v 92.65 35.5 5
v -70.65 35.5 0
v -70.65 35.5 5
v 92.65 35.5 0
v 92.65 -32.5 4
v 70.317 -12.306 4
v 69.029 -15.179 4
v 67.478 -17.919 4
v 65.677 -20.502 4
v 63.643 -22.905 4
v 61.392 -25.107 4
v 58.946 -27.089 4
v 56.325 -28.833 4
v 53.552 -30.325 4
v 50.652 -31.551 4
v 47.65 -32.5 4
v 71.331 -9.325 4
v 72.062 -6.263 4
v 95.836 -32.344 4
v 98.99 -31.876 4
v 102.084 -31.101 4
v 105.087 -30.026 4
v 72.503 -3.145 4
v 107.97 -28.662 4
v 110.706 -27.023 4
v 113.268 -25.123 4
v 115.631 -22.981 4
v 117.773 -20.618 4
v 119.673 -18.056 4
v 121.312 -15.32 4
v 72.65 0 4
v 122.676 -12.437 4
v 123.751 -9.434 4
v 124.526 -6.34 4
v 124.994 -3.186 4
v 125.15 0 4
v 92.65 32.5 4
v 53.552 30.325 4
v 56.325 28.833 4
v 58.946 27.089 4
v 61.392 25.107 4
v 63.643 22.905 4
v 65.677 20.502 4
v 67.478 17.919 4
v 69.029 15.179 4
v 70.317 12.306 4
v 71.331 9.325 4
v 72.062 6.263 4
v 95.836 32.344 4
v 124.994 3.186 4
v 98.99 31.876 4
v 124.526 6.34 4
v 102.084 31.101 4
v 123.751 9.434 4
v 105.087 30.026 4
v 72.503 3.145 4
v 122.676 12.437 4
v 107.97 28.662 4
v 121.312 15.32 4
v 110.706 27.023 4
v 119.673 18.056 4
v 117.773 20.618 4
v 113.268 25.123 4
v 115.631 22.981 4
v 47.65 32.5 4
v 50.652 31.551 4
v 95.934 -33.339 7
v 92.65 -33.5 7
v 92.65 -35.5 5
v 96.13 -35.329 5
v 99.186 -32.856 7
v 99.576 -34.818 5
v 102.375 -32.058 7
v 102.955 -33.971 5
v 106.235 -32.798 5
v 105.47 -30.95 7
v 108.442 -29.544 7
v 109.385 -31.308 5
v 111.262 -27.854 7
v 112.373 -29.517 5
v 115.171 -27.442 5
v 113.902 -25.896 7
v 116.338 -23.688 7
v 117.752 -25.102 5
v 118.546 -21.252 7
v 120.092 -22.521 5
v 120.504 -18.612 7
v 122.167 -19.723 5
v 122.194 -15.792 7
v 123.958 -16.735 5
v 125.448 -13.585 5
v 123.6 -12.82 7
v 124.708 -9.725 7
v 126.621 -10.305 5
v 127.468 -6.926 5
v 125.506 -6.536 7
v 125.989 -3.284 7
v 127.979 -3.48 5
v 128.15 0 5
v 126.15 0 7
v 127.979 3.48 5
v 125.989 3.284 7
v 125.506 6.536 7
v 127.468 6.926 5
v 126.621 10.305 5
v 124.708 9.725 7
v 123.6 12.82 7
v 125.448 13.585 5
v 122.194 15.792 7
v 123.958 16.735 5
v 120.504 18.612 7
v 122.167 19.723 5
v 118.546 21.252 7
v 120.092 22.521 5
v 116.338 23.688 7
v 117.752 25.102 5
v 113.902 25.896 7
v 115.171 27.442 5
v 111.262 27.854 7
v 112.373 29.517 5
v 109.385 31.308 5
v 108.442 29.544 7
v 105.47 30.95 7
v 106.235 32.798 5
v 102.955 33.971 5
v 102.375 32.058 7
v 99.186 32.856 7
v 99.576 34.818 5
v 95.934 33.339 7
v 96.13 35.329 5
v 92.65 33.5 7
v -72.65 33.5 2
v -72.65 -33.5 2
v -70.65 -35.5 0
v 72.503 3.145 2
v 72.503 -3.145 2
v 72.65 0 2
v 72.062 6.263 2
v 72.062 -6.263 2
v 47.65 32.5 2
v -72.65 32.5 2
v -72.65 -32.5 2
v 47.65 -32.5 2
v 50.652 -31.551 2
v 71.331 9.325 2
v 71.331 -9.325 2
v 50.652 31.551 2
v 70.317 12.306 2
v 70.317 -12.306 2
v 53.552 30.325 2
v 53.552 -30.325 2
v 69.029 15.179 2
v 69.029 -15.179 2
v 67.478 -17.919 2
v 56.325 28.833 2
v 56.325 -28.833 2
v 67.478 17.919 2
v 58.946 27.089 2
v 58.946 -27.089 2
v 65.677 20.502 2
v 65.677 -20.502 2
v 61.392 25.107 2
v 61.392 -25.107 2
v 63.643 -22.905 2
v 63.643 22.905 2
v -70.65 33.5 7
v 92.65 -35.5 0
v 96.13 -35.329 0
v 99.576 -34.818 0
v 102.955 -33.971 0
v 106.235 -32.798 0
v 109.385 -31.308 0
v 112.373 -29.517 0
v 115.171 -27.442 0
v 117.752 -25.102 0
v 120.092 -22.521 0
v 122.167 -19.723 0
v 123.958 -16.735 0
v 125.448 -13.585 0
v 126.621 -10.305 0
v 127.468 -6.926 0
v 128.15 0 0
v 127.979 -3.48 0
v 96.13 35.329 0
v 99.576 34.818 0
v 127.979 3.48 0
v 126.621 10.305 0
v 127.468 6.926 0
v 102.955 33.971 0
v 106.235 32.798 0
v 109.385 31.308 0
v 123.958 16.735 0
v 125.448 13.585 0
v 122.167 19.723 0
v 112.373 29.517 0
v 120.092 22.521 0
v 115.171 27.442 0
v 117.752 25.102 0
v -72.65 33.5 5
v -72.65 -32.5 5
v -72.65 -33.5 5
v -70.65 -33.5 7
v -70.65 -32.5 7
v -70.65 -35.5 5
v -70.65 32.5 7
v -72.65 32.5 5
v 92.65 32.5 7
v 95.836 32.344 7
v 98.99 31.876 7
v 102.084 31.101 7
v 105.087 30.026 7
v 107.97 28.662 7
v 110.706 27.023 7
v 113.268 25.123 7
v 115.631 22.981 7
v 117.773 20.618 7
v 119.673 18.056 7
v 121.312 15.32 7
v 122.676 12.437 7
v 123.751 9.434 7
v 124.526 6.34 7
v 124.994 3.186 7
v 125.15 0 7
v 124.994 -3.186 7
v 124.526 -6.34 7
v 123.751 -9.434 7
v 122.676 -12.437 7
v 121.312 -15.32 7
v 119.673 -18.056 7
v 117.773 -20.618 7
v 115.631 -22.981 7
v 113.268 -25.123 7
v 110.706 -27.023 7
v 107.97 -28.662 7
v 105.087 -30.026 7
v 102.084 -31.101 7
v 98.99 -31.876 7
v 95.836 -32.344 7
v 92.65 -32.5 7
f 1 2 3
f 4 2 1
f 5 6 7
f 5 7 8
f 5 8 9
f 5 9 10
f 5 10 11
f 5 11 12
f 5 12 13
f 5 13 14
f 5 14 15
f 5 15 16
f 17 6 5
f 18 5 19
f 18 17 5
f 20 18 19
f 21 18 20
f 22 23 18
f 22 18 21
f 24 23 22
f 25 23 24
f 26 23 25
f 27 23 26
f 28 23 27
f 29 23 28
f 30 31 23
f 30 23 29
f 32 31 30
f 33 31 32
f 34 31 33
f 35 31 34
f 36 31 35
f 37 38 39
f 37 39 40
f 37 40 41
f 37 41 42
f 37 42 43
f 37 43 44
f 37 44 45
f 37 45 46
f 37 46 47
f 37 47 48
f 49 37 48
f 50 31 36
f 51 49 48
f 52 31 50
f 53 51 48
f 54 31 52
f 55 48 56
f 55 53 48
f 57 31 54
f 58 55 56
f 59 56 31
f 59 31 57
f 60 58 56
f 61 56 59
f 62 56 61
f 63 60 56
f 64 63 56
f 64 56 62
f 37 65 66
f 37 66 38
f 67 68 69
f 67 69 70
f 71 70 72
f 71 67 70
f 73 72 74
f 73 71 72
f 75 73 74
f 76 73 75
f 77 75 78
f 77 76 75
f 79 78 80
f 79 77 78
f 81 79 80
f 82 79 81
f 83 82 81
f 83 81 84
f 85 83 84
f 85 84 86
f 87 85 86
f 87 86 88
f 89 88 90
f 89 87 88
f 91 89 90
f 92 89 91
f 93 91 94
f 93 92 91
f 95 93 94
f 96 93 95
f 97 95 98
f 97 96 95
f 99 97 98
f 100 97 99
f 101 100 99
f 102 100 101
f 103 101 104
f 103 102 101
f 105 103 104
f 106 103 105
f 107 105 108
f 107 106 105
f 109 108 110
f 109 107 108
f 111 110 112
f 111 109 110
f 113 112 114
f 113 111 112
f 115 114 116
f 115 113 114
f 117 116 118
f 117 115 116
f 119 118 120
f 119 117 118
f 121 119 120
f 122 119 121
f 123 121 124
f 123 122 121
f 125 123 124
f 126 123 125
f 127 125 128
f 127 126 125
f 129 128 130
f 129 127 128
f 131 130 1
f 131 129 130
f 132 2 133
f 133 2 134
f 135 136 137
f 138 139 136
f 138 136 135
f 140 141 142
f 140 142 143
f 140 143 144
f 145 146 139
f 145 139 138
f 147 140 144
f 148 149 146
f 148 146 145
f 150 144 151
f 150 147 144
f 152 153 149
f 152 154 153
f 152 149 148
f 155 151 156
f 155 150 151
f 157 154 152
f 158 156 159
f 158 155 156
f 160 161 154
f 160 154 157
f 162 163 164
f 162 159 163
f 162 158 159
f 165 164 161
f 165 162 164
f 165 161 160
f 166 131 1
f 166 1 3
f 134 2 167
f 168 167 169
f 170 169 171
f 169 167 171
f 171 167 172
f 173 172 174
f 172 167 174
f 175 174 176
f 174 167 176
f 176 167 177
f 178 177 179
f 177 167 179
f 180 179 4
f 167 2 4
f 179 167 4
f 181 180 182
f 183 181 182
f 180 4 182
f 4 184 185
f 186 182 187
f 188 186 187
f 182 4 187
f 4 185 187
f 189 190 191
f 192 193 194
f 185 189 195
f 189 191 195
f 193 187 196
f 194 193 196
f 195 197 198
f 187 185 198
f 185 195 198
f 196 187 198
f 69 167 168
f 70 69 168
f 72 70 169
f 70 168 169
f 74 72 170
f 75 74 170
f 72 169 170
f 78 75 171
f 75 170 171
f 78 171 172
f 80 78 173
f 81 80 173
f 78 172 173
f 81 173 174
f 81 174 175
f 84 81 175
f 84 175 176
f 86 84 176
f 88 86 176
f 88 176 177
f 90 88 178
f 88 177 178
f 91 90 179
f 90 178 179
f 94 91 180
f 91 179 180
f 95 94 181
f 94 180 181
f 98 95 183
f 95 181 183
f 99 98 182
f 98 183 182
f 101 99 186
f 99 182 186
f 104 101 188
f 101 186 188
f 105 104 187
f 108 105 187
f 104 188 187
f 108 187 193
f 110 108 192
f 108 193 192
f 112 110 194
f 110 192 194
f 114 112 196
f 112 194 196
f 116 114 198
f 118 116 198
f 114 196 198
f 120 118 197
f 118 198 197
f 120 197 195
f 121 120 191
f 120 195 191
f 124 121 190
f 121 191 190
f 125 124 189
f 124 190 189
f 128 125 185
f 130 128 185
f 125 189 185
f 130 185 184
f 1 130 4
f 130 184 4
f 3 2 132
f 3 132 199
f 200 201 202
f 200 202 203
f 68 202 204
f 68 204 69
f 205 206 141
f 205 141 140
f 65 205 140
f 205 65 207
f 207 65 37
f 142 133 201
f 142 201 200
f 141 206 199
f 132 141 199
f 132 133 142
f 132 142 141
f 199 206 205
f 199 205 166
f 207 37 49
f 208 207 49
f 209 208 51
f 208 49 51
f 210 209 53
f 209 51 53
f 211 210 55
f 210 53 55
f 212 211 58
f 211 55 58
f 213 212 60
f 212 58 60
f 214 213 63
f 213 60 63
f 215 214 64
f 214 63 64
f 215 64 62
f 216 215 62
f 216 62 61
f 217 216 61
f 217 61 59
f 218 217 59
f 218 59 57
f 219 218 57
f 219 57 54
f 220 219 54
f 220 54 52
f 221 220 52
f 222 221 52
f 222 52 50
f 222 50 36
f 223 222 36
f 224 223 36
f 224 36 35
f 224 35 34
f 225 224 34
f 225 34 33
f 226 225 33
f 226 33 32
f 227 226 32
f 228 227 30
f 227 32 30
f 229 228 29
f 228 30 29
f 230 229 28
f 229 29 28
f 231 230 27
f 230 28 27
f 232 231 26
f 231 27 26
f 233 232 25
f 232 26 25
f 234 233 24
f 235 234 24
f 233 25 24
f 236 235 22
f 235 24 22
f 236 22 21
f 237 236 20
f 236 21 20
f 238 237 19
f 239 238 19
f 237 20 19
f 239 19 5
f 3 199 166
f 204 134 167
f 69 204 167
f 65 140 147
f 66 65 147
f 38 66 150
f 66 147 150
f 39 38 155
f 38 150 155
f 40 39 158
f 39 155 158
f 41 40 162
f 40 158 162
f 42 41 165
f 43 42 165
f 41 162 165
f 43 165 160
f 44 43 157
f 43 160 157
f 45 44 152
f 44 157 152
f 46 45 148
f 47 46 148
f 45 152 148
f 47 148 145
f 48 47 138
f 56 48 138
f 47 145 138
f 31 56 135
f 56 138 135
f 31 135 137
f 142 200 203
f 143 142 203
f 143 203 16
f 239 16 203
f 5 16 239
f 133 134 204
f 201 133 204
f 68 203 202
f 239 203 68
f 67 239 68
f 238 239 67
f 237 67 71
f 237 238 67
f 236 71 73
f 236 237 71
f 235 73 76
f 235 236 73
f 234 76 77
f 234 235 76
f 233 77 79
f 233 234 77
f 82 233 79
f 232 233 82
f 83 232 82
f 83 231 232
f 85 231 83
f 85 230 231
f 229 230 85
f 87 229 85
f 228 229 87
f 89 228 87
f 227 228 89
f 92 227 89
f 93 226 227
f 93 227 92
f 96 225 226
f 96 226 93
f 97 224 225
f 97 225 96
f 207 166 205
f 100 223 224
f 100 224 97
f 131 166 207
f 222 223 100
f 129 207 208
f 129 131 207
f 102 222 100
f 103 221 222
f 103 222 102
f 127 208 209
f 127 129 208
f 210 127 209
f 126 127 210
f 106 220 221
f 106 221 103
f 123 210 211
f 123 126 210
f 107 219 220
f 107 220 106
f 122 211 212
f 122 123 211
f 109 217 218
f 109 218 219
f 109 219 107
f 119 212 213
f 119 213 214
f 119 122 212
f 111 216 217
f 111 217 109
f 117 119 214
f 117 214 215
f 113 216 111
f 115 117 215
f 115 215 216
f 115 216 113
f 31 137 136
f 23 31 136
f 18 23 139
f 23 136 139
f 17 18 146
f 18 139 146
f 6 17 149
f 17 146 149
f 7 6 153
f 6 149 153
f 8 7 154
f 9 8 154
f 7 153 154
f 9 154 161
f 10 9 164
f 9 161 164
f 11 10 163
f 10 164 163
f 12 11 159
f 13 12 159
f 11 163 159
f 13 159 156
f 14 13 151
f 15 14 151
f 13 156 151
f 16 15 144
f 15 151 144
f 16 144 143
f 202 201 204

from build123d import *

# Parameters (mm, degrees)
F0_W     = 145.3
F0_H     = 65
F1_DEPTH = 2
F0_W_2   = 20
F3_DEPTH = 4
F4_DEPTH = 2
F0_H_2   = 3
F5_DEPTH = 7
F6_DEPTH = 7
F7_SIZE  = 1.99999


# Not quite as in the source:
# - a fillet or chamfer is up to 0.001 mm smaller than in the source, because OpenCascade refuses the exact size


with BuildPart() as f1:
    # F0 (on Top) → F1 (new body)
    with BuildSketch(Plane.XY):
        Rectangle(F0_W, F0_H)
    extrude(amount=F1_DEPTH)

    # F0 (on Top) → F3 (join)
    with BuildSketch(Plane.XY):
        with Locations((82.65, 0)):
            Rectangle(F0_W_2, F0_H)
        with BuildLine():
            ThreePointArc((92.65, -32.5), (125.15, 0), (92.65, 32.5))
            Line((92.65, 32.5), (92.65, -32.5))
        make_face()
    extrude(amount=F3_DEPTH)

    # F2 (on face) → F4 (join)
    with BuildSketch(Plane.XY.offset(2)):
        with BuildLine():
            ThreePointArc((47.65, 32.5), (65.6769816336, 20.5015243336), (72.65, 0))
            Line((72.65, 0), (72.65, 32.5))
            Line((72.65, 32.5), (47.65, 32.5))
        make_face()
        with BuildLine():
            ThreePointArc((72.65, 0), (65.6769816336, -20.5015243336), (47.65, -32.5))
            Line((47.65, -32.5), (72.65, -32.5))
            Line((72.65, -32.5), (72.65, 0))
        make_face()
    extrude(amount=F4_DEPTH)

    # F0 (on Top) → F5 (join)
    with BuildSketch(Plane.XY):
        with BuildLine():
            Line((92.65, 35.5), (92.65, 32.5))
            ThreePointArc((92.65, 32.5), (125.15, 0), (92.65, -32.5))
            Line((92.65, -32.5), (92.65, -35.5))
            ThreePointArc((92.65, -35.5), (128.15, 0), (92.65, 35.5))
        make_face()
        with Locations((82.65, -34)):
            Rectangle(F0_W_2, F0_H_2)
        with Locations((82.65, 34)):
            Rectangle(F0_W_2, F0_H_2)
    extrude(amount=F5_DEPTH)

    # F0 (on Top) → F6 (join)
    with BuildSketch(Plane.XY):
        with Locations((0, -34)):
            Rectangle(F0_W, F0_H_2)
        with Locations((0, 34)):
            Rectangle(F0_W, F0_H_2)
    extrude(amount=F6_DEPTH)

    # F7 (size 2 in the source; OpenCascade refuses exactly that, so slightly less here)
    f7_edges = [f1.edges().sort_by_distance(p)[0] for p in [
        (-72.65, 35.5, 3.5),
        (-72.65, -35.5, 3.5),
        (-72.65, -34, 7),
        (-72.65, 34, 7),
        (-72.65, 0, 0),
        (10, 35.5, 7),
    ]]
    chamfer(f7_edges, length=F7_SIZE)


solid = f1.part
